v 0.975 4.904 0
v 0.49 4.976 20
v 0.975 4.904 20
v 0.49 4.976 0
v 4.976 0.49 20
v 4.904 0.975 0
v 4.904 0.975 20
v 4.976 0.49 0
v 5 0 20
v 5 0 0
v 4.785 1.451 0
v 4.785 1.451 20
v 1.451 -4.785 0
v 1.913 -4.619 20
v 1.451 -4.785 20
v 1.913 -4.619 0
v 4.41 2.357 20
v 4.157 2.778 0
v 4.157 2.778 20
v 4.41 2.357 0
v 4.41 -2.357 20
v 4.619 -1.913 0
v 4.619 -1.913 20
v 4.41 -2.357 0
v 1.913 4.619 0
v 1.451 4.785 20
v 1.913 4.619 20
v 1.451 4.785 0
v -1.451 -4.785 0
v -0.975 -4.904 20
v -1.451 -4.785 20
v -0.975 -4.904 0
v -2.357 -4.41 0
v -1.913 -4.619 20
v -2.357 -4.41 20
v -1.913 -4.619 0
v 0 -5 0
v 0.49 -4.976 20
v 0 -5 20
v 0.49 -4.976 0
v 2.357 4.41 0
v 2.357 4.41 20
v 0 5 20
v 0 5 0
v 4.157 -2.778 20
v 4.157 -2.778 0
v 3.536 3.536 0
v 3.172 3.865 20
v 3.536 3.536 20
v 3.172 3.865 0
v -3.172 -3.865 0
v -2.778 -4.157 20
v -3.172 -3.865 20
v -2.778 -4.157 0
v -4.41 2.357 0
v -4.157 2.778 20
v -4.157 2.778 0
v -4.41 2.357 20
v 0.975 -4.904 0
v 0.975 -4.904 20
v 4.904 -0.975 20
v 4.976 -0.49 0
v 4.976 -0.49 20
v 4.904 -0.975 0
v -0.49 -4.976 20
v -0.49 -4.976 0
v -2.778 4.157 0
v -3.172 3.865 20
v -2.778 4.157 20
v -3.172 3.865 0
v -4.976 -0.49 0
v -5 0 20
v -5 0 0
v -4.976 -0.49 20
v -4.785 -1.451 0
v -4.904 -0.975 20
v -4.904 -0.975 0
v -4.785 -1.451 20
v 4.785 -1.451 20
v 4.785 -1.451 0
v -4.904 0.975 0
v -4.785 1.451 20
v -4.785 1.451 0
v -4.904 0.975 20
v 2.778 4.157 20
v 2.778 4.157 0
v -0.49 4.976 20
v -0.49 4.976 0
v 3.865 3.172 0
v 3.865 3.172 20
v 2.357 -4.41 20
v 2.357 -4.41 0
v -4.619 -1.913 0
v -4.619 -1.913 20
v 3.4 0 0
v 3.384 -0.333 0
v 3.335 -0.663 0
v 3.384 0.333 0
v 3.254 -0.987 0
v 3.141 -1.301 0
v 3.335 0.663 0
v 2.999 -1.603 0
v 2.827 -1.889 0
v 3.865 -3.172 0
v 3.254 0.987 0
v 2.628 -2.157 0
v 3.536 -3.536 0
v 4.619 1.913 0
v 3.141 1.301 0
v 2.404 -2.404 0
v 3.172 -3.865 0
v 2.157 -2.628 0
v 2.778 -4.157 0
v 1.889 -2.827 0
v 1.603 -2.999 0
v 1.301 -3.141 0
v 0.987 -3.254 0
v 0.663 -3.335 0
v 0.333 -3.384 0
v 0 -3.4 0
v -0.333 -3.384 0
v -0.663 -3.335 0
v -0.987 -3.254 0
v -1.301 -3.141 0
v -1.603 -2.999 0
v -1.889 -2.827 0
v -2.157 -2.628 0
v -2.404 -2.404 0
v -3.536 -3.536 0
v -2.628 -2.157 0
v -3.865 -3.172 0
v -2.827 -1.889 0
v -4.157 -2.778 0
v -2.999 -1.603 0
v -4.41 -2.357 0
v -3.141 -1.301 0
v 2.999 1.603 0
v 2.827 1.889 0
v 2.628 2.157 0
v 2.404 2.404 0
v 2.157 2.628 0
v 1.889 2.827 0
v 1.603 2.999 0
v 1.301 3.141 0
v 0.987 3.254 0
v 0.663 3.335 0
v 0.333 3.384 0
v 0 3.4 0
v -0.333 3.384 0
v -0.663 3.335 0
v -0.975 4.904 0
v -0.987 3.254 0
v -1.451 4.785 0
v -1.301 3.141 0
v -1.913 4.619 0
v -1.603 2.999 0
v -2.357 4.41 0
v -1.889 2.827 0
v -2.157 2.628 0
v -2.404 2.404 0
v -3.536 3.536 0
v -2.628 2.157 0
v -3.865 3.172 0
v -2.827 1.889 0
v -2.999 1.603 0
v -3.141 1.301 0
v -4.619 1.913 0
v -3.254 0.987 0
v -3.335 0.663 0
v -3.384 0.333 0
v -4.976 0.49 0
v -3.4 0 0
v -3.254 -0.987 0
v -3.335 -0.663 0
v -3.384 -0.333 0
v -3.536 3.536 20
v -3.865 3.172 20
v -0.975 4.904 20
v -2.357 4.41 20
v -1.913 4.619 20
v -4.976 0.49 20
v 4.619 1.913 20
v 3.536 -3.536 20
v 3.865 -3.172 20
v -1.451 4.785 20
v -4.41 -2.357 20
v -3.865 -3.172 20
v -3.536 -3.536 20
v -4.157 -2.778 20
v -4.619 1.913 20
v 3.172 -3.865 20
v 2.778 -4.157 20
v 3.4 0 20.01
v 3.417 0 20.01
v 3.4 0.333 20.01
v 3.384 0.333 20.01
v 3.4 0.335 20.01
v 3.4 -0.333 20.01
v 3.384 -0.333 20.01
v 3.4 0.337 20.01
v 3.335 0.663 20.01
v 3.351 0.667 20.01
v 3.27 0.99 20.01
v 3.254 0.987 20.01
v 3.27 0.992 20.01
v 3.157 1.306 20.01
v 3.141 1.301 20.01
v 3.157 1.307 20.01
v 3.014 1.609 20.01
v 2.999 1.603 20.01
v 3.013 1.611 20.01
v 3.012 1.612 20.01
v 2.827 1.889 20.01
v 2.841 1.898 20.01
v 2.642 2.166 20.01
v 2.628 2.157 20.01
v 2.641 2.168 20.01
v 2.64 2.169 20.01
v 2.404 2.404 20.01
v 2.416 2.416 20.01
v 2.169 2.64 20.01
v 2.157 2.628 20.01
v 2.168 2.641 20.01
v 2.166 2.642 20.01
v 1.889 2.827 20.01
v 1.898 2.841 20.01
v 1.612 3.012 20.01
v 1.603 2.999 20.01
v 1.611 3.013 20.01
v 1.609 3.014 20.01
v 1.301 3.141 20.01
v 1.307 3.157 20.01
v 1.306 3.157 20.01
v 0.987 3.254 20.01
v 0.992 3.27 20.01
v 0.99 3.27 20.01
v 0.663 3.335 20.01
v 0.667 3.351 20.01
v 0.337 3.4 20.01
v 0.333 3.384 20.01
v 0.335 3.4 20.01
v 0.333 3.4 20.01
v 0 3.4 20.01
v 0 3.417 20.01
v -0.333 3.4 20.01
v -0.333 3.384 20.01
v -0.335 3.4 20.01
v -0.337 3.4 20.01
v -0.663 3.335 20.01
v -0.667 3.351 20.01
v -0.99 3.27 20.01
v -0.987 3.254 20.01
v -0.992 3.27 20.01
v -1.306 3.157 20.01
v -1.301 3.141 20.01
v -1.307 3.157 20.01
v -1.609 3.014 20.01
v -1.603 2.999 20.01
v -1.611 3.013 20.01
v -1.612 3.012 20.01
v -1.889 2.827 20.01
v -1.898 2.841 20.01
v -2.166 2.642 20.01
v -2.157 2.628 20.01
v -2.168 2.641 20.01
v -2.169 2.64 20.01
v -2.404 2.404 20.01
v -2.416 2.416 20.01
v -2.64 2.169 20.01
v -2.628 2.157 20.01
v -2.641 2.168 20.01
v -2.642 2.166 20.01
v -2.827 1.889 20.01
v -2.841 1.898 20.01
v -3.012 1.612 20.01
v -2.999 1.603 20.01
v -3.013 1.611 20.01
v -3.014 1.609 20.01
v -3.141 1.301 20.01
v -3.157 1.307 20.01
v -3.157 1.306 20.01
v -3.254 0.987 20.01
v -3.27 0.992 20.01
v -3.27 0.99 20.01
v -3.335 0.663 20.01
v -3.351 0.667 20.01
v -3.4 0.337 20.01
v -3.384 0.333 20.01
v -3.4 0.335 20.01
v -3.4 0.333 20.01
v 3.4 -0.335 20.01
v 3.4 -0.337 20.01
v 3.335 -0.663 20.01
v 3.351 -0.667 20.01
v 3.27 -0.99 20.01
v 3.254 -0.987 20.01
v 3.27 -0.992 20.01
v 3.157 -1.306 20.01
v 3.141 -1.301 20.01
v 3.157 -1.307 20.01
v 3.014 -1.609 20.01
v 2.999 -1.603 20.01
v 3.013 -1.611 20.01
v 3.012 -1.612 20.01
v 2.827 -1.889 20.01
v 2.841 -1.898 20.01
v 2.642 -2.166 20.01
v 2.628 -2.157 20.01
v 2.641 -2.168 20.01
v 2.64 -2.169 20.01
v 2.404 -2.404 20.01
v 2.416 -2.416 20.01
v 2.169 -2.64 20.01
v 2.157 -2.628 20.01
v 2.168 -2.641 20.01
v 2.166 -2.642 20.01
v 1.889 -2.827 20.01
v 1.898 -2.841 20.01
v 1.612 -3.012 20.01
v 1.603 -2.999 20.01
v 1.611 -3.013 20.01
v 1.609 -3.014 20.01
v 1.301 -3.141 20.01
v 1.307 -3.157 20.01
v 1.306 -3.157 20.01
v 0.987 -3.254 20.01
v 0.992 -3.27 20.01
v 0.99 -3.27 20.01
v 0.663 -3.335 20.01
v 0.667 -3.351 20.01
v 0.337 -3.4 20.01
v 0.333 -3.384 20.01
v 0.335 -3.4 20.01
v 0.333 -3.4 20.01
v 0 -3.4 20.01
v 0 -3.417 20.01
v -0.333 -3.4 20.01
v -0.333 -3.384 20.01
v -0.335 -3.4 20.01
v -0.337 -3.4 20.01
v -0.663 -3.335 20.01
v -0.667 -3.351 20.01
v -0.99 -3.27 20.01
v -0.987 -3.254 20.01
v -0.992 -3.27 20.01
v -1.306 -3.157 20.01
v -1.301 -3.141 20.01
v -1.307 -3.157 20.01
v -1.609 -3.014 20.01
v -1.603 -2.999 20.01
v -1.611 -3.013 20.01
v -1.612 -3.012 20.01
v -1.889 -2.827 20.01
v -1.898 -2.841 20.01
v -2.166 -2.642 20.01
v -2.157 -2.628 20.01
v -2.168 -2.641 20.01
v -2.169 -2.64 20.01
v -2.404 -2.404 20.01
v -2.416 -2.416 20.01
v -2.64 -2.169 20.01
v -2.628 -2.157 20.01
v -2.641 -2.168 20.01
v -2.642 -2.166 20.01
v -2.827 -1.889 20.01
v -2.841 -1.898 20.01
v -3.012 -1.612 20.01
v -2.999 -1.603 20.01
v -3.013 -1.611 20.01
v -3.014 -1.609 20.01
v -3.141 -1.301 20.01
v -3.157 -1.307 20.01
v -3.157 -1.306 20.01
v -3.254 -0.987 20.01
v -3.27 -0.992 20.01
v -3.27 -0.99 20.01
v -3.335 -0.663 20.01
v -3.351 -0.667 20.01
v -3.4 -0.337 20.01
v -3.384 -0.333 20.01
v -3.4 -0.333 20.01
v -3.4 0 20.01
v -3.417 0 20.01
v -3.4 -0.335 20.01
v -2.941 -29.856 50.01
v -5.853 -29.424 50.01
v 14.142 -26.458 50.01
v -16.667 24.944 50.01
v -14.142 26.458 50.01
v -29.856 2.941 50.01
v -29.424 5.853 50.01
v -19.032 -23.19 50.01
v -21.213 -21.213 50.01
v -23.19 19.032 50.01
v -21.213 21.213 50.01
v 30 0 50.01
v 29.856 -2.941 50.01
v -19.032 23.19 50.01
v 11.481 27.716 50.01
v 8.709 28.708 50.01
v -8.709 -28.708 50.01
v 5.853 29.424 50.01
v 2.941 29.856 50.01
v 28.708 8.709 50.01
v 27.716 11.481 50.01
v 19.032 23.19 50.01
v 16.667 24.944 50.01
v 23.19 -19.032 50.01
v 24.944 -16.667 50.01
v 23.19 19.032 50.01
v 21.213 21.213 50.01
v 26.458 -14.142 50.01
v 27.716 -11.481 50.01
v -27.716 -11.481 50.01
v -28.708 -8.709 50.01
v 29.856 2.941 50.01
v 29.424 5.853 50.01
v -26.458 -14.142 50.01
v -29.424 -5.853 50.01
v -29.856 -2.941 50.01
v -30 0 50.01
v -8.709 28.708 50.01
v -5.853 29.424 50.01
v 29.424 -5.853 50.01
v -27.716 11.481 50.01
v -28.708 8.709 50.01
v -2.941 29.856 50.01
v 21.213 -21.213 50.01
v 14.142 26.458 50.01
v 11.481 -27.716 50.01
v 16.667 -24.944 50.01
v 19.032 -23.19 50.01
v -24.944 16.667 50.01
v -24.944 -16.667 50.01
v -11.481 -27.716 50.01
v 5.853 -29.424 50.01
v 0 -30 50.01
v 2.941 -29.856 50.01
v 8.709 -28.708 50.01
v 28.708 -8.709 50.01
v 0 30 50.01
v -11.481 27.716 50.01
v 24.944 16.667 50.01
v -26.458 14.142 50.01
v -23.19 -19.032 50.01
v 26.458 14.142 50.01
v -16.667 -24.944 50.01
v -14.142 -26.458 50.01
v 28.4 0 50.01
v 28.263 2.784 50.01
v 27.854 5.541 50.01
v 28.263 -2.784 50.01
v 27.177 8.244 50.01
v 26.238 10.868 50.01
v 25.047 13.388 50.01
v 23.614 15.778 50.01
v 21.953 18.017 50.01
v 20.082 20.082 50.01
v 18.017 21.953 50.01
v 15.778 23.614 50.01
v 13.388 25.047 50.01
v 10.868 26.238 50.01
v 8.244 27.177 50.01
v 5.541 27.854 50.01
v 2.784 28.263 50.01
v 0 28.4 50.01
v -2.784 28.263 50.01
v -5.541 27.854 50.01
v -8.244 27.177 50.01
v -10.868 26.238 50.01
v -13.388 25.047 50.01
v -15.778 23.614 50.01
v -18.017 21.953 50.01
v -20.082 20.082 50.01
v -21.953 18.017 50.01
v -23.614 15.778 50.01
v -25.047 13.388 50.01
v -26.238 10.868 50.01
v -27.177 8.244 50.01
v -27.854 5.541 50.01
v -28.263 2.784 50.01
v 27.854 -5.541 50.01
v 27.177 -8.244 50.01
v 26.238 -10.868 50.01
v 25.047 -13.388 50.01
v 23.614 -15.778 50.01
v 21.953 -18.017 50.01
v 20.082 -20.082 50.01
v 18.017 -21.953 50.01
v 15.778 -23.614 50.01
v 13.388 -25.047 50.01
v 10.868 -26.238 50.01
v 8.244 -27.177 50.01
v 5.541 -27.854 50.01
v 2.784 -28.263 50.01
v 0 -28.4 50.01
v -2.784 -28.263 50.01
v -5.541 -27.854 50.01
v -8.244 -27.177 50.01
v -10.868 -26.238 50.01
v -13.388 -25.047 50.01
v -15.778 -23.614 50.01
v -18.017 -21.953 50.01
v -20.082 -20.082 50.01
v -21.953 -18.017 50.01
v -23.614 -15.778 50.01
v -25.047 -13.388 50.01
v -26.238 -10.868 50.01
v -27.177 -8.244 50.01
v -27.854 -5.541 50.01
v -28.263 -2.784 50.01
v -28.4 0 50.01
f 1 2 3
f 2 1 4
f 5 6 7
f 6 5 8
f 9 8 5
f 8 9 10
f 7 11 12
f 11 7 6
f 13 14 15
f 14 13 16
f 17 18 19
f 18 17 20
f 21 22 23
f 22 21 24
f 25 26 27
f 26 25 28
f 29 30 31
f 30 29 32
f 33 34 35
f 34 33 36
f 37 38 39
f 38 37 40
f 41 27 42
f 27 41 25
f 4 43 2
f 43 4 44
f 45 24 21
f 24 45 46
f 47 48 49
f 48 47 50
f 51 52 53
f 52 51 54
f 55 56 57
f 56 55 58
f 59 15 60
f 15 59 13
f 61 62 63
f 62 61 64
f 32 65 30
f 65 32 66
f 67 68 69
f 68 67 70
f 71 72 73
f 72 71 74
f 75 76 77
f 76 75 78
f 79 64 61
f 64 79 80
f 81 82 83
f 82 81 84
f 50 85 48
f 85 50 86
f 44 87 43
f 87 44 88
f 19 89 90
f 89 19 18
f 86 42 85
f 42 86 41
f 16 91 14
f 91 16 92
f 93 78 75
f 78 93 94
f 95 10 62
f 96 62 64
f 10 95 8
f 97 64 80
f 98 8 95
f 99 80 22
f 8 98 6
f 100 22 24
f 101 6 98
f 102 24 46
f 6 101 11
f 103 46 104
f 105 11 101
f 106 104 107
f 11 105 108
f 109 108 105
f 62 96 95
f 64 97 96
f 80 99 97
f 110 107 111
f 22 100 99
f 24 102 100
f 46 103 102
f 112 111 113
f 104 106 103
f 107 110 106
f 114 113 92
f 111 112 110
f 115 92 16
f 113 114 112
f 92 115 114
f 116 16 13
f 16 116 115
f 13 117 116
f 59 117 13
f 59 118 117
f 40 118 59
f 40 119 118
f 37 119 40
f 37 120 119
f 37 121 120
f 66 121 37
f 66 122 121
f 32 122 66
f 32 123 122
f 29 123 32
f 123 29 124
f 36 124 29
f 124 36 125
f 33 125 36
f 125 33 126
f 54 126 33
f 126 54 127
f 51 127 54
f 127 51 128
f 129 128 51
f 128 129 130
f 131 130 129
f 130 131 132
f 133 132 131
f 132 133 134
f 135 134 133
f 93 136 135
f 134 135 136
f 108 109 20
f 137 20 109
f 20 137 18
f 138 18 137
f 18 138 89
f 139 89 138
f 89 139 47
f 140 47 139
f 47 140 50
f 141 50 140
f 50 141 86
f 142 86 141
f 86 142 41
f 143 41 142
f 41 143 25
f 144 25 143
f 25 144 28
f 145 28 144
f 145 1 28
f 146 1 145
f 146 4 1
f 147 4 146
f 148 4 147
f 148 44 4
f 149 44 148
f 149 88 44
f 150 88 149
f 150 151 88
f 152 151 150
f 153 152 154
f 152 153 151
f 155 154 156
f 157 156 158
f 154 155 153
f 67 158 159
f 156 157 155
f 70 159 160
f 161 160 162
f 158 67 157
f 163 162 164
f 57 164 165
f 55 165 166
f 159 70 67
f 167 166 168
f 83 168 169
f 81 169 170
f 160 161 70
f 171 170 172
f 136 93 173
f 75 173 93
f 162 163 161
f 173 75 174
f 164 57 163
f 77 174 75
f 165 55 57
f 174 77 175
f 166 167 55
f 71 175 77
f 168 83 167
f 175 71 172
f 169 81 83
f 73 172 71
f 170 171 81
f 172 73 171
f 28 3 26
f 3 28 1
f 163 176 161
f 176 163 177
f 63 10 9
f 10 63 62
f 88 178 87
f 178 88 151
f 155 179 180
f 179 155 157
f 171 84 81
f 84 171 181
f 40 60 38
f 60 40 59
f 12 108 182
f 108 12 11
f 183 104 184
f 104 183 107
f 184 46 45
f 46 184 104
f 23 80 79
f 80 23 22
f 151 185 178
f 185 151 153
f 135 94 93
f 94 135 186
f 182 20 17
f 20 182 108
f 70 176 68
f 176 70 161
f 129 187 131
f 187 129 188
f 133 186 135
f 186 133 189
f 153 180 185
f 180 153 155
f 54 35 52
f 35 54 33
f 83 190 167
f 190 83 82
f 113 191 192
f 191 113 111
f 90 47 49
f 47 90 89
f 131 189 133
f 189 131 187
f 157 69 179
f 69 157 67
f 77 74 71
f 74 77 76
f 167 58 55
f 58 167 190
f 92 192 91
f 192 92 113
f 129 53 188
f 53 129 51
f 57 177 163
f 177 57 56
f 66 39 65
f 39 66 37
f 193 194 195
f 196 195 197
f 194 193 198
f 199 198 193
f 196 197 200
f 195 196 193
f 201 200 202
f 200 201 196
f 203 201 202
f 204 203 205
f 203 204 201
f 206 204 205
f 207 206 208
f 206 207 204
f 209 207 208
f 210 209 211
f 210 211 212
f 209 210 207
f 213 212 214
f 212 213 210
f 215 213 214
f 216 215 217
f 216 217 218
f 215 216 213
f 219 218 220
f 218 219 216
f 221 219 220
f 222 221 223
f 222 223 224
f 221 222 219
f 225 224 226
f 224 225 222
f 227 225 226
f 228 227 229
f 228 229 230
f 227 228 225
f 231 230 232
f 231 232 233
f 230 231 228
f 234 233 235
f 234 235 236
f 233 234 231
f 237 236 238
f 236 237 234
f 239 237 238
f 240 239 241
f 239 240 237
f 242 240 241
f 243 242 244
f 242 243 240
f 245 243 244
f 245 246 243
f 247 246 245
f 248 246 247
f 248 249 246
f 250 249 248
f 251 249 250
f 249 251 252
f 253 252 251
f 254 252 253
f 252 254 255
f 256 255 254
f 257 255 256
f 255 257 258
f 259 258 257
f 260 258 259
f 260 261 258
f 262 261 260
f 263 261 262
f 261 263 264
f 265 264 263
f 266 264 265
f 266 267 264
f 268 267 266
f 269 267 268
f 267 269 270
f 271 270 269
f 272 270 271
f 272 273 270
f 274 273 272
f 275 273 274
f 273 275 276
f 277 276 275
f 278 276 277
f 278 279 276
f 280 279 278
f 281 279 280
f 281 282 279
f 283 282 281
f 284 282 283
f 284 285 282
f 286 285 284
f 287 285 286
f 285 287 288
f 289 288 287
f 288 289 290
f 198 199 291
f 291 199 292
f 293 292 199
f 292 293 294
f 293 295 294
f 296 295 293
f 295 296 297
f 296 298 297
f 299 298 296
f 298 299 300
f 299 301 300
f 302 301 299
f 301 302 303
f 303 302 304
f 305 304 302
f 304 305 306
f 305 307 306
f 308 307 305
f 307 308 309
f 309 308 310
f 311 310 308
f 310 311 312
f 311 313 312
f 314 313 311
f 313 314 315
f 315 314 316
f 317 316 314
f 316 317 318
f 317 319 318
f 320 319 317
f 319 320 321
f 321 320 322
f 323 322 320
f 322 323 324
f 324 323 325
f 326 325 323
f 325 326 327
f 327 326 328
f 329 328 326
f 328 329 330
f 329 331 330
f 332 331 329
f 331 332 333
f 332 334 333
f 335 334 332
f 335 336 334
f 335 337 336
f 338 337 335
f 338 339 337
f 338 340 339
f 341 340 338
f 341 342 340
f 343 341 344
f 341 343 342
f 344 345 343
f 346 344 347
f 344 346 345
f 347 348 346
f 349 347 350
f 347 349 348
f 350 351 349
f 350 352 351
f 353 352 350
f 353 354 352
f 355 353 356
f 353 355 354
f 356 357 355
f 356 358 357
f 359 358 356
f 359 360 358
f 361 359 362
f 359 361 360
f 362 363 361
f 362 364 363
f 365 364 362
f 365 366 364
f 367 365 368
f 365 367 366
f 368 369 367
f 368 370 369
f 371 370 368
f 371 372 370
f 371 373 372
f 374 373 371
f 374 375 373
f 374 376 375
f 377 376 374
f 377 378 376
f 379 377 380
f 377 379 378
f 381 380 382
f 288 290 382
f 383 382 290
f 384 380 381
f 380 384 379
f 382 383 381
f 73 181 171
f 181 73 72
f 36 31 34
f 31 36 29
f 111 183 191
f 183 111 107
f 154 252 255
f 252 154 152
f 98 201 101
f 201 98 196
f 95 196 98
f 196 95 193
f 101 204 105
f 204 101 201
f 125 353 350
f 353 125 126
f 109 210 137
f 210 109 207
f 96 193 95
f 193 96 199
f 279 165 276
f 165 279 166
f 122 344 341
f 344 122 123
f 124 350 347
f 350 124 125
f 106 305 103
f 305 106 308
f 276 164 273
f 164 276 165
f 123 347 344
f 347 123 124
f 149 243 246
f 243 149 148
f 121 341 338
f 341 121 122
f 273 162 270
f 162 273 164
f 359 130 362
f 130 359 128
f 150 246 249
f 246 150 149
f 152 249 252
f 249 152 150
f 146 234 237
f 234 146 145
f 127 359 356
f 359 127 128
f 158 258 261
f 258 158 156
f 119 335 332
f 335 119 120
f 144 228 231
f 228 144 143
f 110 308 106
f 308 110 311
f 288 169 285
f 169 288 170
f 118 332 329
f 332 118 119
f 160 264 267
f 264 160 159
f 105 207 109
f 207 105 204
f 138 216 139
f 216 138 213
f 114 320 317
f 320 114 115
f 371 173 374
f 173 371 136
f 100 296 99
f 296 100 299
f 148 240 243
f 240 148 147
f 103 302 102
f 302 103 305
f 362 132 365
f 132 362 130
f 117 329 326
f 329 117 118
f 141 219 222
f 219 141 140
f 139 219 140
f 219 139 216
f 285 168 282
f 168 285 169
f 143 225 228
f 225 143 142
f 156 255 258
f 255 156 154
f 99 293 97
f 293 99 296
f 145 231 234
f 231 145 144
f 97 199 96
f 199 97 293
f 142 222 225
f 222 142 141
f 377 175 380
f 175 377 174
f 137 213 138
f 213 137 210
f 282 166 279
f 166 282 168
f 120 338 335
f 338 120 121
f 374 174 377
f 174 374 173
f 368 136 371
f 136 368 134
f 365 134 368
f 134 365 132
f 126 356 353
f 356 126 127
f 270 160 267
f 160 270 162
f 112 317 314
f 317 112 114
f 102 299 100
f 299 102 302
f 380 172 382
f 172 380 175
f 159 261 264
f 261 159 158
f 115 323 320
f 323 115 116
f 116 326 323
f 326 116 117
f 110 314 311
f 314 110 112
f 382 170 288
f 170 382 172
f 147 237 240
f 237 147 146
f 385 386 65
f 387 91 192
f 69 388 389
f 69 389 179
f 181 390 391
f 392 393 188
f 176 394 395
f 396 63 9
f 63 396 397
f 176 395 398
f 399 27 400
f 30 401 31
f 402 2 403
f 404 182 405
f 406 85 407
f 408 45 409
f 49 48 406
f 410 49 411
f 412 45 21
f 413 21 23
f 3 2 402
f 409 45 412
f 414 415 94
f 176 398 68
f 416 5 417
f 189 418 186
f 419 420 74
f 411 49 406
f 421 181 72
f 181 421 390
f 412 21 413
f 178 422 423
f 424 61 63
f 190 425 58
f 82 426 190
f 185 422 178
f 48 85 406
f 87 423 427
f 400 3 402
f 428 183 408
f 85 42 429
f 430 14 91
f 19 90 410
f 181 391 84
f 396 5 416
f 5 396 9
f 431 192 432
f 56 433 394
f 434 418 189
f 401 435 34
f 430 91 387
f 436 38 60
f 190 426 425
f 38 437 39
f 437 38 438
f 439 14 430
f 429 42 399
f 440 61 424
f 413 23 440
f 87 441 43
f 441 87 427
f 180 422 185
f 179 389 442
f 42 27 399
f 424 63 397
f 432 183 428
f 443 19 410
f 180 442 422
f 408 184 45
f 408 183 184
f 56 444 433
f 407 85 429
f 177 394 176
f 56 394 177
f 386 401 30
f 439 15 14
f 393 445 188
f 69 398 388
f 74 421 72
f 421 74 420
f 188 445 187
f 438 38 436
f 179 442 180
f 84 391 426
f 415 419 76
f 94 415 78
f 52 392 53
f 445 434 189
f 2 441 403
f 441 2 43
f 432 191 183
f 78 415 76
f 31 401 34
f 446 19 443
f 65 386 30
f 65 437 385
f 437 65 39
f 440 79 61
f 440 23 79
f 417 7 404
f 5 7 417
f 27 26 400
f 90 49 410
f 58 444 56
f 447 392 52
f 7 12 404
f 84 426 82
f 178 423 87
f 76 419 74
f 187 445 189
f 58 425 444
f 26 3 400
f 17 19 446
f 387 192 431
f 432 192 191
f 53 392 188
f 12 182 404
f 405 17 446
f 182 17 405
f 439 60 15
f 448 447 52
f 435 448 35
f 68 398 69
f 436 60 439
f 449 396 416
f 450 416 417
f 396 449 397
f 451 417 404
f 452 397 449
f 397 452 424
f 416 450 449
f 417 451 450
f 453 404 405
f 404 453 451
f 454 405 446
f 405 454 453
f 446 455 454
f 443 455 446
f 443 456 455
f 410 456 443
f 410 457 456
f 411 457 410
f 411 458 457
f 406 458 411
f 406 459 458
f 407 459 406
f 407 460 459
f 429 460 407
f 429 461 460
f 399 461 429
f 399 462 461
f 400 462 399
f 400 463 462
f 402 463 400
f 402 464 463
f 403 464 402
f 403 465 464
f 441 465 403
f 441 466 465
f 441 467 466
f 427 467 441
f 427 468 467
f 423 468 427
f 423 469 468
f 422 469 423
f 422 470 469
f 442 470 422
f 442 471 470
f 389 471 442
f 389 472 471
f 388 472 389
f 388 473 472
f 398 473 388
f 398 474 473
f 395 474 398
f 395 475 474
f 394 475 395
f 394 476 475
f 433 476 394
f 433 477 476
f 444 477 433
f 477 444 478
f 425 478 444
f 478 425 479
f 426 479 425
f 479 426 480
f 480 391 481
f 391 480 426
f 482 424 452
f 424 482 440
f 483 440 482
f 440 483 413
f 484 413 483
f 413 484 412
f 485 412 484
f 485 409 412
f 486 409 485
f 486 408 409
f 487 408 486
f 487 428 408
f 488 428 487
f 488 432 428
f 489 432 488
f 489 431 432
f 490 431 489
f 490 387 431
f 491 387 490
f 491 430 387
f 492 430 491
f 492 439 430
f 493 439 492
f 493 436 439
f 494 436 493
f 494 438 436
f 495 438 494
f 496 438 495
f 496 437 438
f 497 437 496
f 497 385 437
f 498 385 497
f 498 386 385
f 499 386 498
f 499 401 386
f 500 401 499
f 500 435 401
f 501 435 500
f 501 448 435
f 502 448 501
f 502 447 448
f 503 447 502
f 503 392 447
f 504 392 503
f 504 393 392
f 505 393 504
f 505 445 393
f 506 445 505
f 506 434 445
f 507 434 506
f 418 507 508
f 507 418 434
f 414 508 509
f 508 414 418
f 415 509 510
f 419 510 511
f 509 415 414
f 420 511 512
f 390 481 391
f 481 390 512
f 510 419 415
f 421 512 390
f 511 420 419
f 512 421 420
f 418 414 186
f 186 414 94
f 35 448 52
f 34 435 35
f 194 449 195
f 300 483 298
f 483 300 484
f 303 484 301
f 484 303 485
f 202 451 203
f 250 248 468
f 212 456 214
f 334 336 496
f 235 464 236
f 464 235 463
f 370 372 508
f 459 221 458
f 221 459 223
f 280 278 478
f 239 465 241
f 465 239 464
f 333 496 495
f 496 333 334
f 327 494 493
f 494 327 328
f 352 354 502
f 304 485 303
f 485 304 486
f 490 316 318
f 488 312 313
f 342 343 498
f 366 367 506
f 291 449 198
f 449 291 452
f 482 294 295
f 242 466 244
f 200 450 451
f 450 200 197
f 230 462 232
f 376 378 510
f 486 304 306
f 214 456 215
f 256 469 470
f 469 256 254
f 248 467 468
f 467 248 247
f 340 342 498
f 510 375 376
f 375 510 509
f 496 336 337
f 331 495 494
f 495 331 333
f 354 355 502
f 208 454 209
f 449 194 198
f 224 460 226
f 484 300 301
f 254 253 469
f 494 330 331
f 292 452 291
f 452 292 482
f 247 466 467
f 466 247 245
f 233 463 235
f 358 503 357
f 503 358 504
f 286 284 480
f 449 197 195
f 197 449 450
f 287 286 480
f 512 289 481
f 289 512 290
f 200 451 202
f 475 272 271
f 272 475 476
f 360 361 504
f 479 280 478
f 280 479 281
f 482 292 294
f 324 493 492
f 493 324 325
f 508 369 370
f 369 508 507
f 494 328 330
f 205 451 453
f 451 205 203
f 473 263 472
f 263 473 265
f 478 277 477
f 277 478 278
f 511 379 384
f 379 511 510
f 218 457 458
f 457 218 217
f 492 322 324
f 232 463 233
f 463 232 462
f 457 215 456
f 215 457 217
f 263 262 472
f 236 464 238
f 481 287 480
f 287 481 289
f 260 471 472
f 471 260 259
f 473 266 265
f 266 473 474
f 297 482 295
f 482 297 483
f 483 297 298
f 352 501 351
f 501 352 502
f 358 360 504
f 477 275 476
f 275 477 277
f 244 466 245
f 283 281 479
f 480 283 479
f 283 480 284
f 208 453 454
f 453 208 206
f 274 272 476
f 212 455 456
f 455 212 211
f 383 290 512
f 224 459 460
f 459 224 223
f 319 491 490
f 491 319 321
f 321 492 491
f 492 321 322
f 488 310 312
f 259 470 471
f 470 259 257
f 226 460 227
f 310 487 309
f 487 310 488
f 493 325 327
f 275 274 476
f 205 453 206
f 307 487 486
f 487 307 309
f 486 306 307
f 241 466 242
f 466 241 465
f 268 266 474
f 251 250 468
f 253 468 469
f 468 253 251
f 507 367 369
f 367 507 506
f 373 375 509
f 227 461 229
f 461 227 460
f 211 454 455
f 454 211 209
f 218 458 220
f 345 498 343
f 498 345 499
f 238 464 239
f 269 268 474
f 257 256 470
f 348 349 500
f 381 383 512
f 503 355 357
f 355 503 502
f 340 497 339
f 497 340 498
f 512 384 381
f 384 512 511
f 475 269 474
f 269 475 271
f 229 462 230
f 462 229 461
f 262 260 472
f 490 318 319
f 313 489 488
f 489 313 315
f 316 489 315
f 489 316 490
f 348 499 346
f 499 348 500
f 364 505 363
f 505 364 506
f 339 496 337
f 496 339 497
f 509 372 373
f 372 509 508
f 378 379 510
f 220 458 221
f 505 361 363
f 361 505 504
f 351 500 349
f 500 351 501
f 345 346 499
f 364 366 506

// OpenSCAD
// Lab Funnel Design
// Wall thickness: 1.6 mm
// Spout: 10 mm outer diameter, 20 mm tall (z = 0 to z = 20)
// Cone: 10 mm outer diameter at z = 20, 60 mm outer diameter at z = 50

$fn = 64;

wall_thickness = 1.6;
spout_height = 20;
spout_outer_diameter = 10;
spout_inner_diameter = spout_outer_diameter - 2 * wall_thickness;
cone_height = 30; // from z=20 to z=50
cone_top_diameter = spout_outer_diameter;
cone_bottom_diameter = 60;

// Spout (cylinder with hole)
module spout() {
    difference() {
        cylinder(h = spout_height + 0.01, d = spout_outer_diameter, center = false);
        translate([0, 0, -0.01]) 
            cylinder(h = spout_height + 0.02, d = spout_inner_diameter, center = false);
    }
}

// Cone (frustum with hole)
module cone() {
    translate([0, 0, spout_height]) {
        difference() {
            // Outer cone
            cylinder(h = cone_height + 0.01, 
                     r1 = cone_top_diameter / 2, 
                     r2 = cone_bottom_diameter / 2, 
                     center = false);
            // Inner cone (smaller by wall_thickness)
            translate([0, 0, -0.01]) 
                cylinder(h = cone_height + 0.02, 
                         r1 = (cone_top_diameter - 2 * wall_thickness) / 2, 
                         r2 = (cone_bottom_diameter - 2 * wall_thickness) / 2, 
                         center = false);
        }
    }
}

// Build the funnel
spout();
cone();
